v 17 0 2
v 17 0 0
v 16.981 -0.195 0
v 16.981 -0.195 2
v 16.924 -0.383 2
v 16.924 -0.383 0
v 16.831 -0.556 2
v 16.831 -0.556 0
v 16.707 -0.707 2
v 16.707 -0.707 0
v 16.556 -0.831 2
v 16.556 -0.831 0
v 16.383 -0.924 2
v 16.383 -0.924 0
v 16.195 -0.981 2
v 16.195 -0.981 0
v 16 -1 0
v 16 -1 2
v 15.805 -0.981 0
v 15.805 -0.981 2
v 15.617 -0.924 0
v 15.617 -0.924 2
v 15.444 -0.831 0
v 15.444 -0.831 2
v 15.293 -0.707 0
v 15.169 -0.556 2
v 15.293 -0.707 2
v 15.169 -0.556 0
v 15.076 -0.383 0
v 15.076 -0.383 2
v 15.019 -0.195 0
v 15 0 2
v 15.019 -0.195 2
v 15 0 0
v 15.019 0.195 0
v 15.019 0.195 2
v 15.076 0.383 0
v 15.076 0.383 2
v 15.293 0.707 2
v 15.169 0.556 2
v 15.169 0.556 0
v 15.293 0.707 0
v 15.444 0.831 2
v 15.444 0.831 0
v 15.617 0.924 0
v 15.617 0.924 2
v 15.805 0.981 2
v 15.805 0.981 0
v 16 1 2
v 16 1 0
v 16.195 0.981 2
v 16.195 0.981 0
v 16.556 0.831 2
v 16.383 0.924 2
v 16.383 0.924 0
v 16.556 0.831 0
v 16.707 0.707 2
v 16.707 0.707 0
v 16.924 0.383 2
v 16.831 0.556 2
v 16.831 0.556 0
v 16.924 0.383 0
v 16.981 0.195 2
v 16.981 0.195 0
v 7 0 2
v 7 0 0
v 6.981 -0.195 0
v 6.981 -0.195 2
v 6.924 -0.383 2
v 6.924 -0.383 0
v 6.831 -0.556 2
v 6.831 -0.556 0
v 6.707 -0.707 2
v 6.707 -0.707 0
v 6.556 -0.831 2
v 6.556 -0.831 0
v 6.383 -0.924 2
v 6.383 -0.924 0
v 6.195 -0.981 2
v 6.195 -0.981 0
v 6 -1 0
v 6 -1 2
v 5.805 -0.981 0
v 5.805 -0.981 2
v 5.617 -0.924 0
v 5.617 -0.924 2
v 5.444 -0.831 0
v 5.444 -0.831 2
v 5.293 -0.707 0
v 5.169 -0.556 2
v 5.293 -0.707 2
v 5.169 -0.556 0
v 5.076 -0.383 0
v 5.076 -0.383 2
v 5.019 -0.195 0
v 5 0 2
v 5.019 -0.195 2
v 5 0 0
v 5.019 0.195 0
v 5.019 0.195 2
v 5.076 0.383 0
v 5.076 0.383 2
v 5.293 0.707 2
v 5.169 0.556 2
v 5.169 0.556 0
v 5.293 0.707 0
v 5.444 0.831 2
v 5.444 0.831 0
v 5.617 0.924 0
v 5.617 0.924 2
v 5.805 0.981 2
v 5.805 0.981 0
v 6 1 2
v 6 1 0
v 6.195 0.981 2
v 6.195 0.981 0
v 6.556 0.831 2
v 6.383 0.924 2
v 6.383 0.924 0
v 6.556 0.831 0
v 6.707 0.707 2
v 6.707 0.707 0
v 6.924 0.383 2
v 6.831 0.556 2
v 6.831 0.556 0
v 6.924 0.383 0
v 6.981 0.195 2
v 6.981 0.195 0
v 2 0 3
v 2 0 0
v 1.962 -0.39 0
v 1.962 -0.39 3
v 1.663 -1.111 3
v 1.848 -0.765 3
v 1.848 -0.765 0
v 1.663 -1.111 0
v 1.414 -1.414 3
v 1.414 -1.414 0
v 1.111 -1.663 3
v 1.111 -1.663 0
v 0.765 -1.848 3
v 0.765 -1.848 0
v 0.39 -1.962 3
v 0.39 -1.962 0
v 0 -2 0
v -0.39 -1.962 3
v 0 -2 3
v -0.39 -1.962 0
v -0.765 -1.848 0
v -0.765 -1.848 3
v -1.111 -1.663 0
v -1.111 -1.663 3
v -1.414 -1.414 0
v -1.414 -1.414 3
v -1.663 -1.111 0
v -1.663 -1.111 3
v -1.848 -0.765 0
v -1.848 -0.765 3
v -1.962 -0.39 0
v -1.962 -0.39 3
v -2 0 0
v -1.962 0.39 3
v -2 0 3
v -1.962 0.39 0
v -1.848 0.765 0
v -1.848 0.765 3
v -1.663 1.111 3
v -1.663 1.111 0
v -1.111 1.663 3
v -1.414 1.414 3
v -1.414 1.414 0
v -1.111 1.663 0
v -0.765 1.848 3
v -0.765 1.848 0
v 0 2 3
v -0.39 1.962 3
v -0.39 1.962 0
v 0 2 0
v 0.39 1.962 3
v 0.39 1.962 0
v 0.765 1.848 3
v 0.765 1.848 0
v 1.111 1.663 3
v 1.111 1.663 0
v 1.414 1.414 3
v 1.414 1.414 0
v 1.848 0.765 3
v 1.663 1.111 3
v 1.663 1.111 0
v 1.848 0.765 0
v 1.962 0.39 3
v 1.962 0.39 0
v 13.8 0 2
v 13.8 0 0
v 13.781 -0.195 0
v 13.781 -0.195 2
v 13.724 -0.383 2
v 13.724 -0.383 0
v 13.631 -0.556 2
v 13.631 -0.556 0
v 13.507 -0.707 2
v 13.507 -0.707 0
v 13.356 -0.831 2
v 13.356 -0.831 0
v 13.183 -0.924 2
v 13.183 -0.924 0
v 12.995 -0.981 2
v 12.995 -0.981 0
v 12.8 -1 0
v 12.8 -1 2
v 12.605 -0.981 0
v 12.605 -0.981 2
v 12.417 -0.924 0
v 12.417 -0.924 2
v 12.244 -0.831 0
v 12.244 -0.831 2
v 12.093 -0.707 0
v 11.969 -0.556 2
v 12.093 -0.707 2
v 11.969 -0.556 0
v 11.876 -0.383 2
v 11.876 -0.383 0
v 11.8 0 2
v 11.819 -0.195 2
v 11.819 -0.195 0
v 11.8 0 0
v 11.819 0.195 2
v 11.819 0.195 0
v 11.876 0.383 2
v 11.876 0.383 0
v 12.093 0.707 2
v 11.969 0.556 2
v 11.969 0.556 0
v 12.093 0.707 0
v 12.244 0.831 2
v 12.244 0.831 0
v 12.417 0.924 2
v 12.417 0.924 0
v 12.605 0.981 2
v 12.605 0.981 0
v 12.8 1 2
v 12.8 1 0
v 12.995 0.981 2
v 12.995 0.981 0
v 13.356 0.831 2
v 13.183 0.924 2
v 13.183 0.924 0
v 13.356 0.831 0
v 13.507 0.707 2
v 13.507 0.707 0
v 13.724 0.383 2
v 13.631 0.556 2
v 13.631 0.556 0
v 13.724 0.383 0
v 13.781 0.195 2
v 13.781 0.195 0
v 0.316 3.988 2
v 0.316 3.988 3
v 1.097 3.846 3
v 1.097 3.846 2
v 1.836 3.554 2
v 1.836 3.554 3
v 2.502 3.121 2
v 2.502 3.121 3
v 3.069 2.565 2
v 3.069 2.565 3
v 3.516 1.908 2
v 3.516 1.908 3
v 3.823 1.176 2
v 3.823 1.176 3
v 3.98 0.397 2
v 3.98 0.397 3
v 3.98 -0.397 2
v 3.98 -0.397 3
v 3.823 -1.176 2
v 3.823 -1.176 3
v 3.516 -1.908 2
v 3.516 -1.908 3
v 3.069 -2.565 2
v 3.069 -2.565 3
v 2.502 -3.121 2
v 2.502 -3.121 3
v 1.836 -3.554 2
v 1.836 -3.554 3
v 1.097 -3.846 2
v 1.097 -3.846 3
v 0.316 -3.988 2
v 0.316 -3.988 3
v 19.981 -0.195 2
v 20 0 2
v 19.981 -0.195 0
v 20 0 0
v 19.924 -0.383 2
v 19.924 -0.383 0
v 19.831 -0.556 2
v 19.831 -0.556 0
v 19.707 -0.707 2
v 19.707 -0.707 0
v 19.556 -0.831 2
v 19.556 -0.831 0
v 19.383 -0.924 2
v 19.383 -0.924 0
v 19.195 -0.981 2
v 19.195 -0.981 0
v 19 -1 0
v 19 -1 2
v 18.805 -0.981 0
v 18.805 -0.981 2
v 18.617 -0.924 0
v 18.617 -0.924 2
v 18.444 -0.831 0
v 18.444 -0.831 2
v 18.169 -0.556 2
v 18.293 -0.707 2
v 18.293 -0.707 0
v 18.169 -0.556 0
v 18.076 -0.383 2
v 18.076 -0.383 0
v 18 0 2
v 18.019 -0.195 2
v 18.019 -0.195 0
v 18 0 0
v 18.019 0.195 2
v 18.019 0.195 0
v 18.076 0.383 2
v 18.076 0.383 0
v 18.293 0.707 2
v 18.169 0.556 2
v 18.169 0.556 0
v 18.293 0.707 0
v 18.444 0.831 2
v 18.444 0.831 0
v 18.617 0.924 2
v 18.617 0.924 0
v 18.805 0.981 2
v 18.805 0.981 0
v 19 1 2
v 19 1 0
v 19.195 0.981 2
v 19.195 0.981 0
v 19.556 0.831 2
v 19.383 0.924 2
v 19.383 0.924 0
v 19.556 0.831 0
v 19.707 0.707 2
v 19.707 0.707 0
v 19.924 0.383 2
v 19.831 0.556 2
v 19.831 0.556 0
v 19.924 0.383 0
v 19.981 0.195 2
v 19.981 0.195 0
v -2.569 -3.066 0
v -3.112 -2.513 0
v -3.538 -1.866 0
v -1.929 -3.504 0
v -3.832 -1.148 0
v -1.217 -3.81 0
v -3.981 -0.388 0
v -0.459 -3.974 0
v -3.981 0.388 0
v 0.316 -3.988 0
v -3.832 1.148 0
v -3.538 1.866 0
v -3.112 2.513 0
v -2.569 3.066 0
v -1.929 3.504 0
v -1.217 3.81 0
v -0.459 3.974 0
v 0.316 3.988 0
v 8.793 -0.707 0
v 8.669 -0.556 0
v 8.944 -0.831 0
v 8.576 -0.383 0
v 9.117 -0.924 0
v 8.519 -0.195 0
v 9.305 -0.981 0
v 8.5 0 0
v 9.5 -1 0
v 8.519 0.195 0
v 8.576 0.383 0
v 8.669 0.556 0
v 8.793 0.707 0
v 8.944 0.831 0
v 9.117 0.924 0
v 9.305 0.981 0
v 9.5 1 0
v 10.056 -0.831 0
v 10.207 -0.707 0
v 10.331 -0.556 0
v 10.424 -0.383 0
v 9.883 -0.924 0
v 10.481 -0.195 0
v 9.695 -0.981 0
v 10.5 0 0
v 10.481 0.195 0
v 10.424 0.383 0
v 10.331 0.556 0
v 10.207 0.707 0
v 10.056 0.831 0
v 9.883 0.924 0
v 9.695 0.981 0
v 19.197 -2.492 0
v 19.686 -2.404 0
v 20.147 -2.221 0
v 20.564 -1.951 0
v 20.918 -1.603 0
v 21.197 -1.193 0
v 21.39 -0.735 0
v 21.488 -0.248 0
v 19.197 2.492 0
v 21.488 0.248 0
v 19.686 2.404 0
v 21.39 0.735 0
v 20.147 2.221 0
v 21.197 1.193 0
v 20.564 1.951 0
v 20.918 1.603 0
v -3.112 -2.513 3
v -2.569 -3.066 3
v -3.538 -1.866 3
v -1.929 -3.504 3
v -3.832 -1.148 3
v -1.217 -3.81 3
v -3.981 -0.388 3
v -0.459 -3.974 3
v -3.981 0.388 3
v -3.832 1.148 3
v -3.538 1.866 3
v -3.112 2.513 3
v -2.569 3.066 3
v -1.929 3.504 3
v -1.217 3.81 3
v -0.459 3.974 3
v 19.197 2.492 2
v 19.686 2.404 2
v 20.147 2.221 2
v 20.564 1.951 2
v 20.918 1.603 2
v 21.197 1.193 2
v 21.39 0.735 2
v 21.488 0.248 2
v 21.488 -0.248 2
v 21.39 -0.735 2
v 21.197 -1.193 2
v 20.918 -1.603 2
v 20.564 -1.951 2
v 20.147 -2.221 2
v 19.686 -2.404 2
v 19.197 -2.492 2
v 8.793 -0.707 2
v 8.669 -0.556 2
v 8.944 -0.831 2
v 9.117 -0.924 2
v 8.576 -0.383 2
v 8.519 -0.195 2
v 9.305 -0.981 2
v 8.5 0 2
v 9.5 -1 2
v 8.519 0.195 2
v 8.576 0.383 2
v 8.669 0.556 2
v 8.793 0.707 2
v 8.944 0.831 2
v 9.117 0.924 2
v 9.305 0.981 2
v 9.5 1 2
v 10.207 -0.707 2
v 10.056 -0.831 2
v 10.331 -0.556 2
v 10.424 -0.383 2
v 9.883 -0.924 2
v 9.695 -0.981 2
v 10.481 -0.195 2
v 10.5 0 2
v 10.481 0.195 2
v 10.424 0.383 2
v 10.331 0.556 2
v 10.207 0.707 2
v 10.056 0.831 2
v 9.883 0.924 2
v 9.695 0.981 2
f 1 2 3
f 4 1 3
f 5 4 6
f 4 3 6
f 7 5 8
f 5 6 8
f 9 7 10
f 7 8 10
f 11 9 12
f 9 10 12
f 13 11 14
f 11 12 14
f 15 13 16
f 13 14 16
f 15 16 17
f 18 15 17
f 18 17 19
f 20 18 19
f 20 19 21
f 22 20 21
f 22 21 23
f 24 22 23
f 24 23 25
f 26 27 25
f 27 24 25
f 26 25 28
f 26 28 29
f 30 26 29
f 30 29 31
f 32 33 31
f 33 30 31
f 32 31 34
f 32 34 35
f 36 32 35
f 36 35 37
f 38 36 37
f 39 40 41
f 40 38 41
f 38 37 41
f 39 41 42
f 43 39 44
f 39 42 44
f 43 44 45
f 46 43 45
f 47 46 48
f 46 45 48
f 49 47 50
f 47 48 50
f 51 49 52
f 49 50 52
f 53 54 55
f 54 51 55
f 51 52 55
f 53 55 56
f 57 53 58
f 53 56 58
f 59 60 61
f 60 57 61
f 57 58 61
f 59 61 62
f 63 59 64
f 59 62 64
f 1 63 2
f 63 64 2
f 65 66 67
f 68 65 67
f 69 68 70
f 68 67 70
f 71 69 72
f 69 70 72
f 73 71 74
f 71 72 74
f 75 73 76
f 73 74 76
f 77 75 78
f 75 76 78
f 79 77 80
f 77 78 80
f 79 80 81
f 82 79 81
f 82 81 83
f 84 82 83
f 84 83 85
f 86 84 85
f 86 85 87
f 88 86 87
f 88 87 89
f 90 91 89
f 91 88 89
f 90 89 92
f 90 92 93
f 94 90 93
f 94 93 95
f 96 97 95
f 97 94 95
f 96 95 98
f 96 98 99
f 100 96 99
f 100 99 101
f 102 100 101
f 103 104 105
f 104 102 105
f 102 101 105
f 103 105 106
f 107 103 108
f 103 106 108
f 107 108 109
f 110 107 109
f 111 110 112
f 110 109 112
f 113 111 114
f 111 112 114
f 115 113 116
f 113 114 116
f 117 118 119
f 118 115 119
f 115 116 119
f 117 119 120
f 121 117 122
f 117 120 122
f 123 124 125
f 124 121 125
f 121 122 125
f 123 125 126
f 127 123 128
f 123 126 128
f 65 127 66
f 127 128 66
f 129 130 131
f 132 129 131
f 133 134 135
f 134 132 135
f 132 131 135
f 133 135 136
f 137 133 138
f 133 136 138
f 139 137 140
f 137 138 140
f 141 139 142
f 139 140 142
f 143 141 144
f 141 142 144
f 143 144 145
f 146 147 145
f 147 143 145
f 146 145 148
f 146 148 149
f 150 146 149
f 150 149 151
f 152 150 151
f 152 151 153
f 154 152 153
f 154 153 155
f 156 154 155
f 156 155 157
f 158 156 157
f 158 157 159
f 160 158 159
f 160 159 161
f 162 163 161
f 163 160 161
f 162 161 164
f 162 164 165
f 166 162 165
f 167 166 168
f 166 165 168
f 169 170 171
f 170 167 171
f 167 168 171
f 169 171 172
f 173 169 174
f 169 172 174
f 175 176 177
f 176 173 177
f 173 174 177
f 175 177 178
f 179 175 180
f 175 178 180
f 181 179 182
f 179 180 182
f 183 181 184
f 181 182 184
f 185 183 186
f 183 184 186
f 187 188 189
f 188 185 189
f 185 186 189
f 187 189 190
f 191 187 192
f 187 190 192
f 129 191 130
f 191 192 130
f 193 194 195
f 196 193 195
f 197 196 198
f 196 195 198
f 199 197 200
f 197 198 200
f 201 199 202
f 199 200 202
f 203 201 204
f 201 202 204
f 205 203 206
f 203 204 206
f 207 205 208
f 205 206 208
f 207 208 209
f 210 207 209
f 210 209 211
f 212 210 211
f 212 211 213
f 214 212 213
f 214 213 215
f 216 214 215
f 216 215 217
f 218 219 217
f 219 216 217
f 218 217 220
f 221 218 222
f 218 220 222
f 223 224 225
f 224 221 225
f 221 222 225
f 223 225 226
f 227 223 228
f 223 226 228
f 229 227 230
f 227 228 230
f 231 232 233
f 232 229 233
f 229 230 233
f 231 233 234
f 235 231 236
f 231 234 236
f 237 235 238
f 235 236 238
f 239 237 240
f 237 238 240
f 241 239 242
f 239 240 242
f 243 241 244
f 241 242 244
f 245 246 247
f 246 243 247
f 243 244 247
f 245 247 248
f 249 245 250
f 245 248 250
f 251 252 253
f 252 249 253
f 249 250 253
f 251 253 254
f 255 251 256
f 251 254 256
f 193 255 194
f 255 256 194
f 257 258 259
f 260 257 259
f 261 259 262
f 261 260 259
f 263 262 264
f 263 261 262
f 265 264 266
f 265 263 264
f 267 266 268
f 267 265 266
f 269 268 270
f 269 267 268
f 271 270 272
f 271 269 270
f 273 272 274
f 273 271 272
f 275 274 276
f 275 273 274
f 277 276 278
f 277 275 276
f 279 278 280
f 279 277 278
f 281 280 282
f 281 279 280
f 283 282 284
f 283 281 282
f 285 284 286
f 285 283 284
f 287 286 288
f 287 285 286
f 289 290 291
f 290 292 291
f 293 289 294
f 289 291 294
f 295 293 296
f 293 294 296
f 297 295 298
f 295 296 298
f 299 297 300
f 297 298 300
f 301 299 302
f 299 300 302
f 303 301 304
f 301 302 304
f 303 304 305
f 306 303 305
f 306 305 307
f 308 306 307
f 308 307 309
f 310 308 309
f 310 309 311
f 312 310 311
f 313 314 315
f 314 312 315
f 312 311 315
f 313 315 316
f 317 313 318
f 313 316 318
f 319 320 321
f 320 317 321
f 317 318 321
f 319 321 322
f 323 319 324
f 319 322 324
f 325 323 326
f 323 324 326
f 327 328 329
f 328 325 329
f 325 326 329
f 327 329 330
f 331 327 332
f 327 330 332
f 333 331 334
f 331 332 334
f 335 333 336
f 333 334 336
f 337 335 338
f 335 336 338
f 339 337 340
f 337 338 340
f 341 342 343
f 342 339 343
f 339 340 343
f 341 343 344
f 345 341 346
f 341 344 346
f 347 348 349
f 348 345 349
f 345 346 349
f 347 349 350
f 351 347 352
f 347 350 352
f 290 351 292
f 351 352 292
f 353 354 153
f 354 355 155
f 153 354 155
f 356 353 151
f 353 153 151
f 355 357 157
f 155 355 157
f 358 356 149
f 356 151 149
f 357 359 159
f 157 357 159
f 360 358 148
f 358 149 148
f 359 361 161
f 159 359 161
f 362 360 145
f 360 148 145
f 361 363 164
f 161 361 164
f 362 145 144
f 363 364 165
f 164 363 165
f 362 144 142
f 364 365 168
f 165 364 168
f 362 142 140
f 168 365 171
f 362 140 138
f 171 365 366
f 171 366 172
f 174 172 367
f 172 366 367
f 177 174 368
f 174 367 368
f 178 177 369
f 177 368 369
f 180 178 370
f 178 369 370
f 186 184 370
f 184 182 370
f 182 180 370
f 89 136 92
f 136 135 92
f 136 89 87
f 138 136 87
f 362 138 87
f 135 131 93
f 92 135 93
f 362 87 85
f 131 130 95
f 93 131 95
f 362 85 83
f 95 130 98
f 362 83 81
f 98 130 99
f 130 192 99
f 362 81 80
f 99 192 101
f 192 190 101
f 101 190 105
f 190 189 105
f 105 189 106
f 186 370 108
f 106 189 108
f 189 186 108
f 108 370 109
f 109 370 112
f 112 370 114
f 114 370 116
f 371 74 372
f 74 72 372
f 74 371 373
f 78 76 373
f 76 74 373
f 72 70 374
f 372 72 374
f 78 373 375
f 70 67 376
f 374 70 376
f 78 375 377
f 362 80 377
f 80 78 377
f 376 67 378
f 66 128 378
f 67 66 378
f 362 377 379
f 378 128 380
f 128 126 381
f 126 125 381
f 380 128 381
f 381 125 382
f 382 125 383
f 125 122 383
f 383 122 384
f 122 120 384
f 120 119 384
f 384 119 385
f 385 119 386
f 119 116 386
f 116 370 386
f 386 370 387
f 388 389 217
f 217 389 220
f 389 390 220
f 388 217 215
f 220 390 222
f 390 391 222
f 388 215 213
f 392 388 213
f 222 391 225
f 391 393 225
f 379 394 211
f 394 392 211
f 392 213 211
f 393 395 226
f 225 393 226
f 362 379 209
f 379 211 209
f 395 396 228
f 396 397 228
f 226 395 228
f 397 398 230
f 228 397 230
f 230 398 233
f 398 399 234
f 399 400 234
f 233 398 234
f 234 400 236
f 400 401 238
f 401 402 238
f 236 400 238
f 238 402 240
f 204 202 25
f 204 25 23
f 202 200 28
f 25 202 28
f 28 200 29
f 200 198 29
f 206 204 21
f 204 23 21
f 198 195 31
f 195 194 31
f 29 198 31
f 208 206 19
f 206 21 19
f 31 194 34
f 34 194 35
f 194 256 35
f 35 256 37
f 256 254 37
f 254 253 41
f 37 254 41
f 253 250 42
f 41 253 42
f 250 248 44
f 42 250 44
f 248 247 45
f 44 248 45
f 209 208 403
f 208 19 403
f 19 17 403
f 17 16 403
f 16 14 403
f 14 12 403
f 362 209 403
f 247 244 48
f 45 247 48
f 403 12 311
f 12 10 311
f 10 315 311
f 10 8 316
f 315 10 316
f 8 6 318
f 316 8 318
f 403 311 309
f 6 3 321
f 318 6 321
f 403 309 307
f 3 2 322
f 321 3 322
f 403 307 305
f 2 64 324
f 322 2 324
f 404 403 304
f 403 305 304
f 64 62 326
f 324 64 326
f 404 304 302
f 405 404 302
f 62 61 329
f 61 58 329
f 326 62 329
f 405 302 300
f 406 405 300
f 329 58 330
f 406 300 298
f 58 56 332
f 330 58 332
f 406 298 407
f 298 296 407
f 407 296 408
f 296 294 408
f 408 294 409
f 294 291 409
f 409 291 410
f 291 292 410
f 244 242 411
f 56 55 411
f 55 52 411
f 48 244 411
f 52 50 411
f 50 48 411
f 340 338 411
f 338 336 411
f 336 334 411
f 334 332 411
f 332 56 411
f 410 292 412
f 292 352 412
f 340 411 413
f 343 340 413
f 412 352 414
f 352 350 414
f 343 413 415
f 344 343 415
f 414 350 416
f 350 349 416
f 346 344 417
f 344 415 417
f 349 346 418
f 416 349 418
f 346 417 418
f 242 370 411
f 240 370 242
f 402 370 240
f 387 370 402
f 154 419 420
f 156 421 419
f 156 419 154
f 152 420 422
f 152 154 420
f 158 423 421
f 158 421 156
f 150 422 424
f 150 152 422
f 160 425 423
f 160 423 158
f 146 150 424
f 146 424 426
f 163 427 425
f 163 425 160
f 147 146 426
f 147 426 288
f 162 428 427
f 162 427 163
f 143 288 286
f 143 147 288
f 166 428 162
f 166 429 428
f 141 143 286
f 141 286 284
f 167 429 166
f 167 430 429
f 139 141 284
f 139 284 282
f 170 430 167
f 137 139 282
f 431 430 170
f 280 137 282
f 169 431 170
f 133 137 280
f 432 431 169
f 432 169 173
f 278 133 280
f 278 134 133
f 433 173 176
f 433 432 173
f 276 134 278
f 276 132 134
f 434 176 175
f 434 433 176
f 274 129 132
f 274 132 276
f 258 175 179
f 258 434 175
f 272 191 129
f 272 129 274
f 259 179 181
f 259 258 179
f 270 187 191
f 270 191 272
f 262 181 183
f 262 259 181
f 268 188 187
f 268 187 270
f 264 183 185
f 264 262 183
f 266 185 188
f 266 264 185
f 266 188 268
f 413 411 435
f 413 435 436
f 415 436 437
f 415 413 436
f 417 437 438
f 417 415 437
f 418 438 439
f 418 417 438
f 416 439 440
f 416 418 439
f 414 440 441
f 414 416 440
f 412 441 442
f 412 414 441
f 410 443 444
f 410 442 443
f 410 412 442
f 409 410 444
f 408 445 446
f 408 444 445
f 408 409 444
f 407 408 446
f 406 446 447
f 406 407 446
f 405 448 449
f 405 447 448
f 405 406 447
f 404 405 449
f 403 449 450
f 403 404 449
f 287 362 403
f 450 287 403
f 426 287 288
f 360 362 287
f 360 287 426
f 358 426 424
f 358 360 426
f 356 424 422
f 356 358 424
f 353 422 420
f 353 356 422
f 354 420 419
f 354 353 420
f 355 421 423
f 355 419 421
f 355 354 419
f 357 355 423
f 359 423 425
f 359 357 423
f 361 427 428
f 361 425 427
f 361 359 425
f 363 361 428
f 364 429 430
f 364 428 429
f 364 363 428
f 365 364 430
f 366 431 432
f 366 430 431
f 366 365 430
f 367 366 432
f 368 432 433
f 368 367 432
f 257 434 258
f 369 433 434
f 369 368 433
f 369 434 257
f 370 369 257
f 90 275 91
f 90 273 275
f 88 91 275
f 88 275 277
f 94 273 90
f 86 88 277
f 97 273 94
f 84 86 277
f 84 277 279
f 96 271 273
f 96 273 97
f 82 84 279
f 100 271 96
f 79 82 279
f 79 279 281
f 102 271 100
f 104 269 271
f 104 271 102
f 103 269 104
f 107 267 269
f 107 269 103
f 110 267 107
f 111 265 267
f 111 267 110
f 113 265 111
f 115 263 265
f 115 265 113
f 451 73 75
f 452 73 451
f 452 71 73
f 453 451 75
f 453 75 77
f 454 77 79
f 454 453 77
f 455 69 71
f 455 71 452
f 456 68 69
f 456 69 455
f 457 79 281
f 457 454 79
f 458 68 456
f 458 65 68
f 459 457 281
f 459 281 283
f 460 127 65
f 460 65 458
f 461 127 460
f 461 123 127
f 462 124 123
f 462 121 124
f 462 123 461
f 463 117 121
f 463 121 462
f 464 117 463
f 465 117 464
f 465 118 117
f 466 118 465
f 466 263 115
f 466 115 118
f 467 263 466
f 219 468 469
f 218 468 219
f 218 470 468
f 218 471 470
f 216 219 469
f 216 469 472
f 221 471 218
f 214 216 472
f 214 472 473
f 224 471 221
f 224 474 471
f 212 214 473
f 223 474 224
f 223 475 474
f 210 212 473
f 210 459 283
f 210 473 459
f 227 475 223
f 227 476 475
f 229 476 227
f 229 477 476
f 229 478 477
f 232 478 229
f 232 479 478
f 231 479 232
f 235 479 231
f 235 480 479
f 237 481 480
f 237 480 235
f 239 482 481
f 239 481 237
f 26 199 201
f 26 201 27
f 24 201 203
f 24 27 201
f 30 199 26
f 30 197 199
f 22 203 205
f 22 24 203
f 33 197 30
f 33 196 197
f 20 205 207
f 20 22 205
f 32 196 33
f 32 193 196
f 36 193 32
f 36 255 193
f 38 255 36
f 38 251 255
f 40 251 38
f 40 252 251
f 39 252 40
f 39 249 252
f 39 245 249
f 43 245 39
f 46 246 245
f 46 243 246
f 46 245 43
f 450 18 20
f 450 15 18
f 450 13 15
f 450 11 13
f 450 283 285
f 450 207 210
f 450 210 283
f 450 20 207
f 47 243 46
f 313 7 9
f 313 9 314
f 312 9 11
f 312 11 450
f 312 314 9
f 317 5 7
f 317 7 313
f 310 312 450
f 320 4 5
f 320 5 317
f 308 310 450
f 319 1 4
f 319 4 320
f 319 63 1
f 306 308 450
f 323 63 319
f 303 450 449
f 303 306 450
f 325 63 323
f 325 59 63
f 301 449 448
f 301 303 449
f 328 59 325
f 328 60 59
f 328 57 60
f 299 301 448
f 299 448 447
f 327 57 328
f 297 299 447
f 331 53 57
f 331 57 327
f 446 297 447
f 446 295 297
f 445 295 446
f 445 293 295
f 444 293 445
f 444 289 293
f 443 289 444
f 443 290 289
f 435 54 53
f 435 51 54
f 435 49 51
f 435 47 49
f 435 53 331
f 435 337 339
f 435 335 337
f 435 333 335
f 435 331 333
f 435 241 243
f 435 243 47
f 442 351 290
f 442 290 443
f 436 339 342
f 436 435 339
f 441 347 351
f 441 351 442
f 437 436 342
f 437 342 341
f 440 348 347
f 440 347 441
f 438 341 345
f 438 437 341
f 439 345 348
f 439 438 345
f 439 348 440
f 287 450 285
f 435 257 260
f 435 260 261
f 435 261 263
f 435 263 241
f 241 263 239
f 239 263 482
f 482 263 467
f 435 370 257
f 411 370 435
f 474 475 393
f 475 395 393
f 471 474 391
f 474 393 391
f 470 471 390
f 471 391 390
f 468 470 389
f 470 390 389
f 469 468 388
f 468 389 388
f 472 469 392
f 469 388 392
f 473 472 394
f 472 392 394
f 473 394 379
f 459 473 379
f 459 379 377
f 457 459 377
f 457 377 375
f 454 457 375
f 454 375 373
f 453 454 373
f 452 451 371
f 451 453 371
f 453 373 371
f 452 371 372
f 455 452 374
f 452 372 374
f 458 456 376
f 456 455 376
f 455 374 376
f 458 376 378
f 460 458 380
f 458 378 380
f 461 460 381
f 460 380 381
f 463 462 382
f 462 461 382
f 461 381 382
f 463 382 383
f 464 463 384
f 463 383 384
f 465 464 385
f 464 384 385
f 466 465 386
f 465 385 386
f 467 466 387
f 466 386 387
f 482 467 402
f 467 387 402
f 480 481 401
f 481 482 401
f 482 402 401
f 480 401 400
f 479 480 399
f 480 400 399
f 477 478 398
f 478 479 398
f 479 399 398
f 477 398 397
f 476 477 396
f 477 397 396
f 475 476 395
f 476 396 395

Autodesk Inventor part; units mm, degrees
ref_plane "YZ Plane" through (0, 0, 0) normal (1, 0, 0) x (0, 1, 0)
ref_plane "XZ Plane" through (0, 0, 0) normal (0, 1, 0) x (-1, 0, 0)
ref_plane "XY Plane" through (0, 0, 0) normal (0, 0, 1) x (1, 0, 0)
sketch "Skizze1" plane through (0, 0, 0) normal (0, 0, 1) x (1, 0, 0)
  line L0 (0, 5.6) -> (0, -5.6) construction
  line L1 (-9.1, 0) -> (26.6, 0) construction
  circle A0 centre (0, 0) radius 2
  circle A1 centre (9.5, 0) radius 1
  circle A2 centre (16, 0) radius 1
  circle A3 centre (19, 0) radius 1
  arc A4 (19.1974, -2.4922) -> (19.1974, 2.4922) centre (19, 0) ccw
  arc A5 (0.3158, 3.9875) -> (0.3158, -3.9875) centre (0, 0) ccw
  line L2 (0.3158, 3.9875) -> (19.1974, 2.4922)
  line L3 (0.3158, -3.9875) -> (19.1974, -2.4922)
  circle A6 centre (6, 0) radius 1
  circle A7 centre (12.8, 0) radius 1
  circle A8 centre (0, 0) radius 4
  point P0 (0.5263, 3.9652)
  point P1 (0.6579, -1.8887)
  point P2 (0.6579, 1.8887)
  dimension "d0" = 9.5
  dimension "d1" = 16
  dimension "d2" = 19
  dimension "d3" = 5
  dimension "d4" = 2
  dimension "d5" = 4
  dimension "d6" = 8
  dimension "d16" = 6
  dimension "d17" = 12.8
extrude "Extrusion1" add sketch "Skizze1" along normal blind 2
extrude "Extrusion2" add sketch "Skizze1" along normal blind 3 contours A5 A8
properties part number "Servo-Arm-20mm"
